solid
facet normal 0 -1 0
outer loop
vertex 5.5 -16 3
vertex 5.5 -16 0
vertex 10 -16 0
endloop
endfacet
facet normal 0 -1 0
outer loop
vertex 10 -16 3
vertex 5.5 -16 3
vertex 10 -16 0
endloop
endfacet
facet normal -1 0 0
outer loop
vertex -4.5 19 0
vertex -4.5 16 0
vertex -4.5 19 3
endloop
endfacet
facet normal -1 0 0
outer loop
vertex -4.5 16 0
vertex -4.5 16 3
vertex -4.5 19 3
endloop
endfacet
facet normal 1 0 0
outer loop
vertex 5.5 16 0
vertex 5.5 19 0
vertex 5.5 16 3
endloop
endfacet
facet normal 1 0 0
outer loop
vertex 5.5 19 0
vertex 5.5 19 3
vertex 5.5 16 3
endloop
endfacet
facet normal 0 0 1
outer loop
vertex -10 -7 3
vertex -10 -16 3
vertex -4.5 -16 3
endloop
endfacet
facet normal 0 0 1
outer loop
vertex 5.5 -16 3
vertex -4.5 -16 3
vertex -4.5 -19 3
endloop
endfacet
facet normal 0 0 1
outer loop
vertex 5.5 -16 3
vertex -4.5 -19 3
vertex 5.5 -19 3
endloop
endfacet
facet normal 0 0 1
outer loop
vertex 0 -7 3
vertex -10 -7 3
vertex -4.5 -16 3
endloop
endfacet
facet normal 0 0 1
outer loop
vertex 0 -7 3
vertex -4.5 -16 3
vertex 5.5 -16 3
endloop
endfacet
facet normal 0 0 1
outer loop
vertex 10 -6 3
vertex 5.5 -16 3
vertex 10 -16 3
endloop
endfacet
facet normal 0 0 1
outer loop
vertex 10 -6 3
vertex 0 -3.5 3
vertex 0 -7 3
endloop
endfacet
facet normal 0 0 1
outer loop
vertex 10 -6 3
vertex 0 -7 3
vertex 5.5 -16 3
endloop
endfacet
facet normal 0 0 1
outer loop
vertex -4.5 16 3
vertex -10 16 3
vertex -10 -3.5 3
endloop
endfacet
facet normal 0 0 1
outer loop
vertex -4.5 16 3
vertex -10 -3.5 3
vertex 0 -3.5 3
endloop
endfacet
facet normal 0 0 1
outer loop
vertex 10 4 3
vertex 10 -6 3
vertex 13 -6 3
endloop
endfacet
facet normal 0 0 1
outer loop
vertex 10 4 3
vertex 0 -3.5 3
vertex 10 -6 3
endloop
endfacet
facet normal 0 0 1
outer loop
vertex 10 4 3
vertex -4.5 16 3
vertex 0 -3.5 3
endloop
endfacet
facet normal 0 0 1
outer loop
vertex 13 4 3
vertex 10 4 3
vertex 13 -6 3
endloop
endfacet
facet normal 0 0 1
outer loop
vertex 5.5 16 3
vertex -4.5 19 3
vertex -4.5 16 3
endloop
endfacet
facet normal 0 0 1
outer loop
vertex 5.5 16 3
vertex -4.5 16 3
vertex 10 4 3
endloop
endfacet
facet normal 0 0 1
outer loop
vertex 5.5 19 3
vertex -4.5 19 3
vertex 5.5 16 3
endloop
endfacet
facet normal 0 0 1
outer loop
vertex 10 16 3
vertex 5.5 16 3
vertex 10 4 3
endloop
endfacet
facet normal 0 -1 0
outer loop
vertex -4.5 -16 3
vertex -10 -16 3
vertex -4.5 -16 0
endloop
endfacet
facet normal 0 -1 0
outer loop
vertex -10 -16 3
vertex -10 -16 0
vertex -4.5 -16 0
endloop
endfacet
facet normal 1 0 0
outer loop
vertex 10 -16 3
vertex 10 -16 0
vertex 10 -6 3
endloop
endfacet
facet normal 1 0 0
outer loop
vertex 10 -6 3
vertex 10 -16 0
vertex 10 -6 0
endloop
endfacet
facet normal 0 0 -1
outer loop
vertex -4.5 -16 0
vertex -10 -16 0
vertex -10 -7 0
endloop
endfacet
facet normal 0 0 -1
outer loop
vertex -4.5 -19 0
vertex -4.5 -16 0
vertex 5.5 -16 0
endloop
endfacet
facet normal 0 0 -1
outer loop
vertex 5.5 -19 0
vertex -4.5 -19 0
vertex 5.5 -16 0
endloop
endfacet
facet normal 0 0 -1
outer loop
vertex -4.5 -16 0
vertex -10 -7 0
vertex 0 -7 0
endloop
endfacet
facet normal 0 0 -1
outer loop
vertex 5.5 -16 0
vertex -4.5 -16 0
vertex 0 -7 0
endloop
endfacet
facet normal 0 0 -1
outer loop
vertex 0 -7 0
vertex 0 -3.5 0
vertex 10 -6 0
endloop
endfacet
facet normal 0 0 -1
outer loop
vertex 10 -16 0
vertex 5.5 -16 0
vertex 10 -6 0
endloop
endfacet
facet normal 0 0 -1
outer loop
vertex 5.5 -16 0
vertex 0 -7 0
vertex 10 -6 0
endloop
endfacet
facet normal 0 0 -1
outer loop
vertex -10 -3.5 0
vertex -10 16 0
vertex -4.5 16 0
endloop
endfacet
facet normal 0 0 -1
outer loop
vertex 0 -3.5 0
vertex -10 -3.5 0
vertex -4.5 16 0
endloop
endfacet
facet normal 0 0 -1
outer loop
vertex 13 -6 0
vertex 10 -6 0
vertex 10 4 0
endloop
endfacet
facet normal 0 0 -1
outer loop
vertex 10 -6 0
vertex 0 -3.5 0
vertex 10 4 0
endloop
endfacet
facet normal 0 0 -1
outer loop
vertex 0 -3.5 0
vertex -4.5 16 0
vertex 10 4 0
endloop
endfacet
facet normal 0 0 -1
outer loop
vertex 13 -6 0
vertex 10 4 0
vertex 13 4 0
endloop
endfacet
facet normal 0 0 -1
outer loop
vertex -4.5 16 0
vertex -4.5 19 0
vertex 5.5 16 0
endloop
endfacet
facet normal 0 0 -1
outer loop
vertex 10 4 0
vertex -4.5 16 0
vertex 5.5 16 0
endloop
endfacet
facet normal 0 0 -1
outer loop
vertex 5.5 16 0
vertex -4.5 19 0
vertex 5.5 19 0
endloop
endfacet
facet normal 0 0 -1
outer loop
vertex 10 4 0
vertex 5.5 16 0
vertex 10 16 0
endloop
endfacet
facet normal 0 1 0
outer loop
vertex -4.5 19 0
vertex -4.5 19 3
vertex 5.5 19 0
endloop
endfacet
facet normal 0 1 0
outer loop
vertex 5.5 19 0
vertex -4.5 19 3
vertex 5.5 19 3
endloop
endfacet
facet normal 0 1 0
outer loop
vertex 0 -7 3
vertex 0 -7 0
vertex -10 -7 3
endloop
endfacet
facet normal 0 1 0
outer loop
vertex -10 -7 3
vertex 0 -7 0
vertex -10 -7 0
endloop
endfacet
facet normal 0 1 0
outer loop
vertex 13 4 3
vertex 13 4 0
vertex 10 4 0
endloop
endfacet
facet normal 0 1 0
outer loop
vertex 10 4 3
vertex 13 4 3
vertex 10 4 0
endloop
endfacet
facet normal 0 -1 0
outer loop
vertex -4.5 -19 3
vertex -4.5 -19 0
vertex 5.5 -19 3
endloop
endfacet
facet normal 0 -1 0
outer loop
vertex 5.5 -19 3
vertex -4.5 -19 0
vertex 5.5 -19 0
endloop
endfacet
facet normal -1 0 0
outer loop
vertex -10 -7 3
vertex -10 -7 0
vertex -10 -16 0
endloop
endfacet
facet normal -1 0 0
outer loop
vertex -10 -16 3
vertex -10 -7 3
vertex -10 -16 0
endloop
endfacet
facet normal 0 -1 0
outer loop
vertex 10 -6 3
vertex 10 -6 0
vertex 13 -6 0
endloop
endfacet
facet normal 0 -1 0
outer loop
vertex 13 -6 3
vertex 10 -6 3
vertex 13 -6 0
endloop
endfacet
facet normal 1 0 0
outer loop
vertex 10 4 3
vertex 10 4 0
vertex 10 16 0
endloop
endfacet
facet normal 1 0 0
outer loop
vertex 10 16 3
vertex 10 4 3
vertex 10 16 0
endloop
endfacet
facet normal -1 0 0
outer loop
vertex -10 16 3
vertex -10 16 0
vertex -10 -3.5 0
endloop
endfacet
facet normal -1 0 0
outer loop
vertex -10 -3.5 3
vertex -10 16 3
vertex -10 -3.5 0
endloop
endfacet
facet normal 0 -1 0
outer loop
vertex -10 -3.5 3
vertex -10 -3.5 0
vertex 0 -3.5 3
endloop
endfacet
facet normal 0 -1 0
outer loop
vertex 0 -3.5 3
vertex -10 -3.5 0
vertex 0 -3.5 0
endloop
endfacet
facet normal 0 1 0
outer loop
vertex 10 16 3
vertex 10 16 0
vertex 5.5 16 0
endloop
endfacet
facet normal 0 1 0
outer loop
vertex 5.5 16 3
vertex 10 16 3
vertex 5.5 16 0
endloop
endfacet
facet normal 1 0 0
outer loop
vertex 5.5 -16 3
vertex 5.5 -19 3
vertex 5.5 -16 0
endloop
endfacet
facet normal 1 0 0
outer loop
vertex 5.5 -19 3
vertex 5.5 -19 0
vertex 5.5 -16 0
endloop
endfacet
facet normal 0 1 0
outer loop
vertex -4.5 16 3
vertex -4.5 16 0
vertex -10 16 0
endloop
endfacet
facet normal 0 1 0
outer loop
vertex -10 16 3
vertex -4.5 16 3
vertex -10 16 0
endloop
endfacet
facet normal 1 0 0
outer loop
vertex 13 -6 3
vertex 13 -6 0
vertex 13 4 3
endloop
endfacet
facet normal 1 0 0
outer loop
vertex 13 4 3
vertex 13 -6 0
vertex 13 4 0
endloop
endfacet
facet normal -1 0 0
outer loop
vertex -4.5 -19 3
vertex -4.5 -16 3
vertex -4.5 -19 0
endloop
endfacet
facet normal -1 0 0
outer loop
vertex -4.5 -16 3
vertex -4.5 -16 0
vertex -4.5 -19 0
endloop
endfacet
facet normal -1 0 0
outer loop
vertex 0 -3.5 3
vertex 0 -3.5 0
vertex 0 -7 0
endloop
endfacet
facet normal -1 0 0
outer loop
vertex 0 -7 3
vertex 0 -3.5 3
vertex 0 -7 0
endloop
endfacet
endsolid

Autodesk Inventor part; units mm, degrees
ref_plane "YZ Plane" through (0, 0, 0) normal (1, 0, 0) x (0, 1, 0)
ref_plane "XZ Plane" through (0, 0, 0) normal (0, 1, 0) x (-1, 0, 0)
ref_plane "XY Plane" through (0, 0, 0) normal (0, 0, 1) x (1, 0, 0)
sketch "Sketch1" plane through (0, 0, 0) normal (0, 0, 1) x (1, 0, 0)
  line L0 (-10, -16) -> (10, -16)
  line L1 (10, -16) -> (10, 16)
  line L2 (10, 16) -> (-10, 16)
  line L3 (-10, 16) -> (-10, -16)
  line L4 (-10, -16) -> (10, 16) construction
  line L5 (10, -16) -> (-10, 16) construction
  point P0 (0, 0)
  dimension "d0" = 32
  dimension "d1" = 20
extrude "Extrusion1" add sketch "Sketch1" along normal blind 3
sketch "Sketch2" plane through (0, 0, 0) normal (0, 0, -1) x (-1, 0, 0)
  line L0 (10, -16) -> (-10, -16) projected
  line L1 (-5.5, -16) -> (4.5, -16)
  line L2 (4.5, -16) -> (4.5, -19)
  line L3 (4.5, -19) -> (-5.5, -19)
  line L4 (-5.5, -19) -> (-5.5, -16)
  line L5 (-10, -16) -> (-10, 16) projected
  point P0 (0, 0)
  dimension "d4" = 10
  dimension "d5" = 3
  dimension "d6" = 4.5
extrude "Extrusion2" add sketch "Sketch2" against normal blind 3
sketch "Sketch3" plane through (0, 0, 0) normal (0, 0, -1) x (-1, 0, 0)
  line L0 (-10, -16) -> (-10, 16) projected
  line L1 (-10, -6) -> (-13, -6)
  line L2 (-13, -6) -> (-13, 4)
  line L3 (-13, 4) -> (-10, 4)
  line L4 (-10, 4) -> (-10, -6)
  line L5 (-5.5, -16) -> (-10, -16) projected
  point P0 (0, 0)
  dimension "d9" = 3
  dimension "d10" = 10
  dimension "d11" = 10
extrude "Extrusion3" add sketch "Sketch3" against normal blind 3
sketch "Sketch4" plane through (0, 0, 0) normal (0, 0, -1) x (-1, 0, 0)
  line L0 (10, 16) -> (10, -16) projected
  line L1 (10, -3.5) -> (0, -3.5)
  line L2 (0, -3.5) -> (0, -7)
  line L3 (0, -7) -> (10, -7)
  line L4 (10, -7) -> (10, -3.5)
  line L5 (10, -16) -> (4.5, -16) projected
  point P0 (0, 0)
  dimension "d14" = 10
  dimension "d15" = 3.5
  dimension "d16" = 9
extrude "Extrusion4" cut sketch "Sketch4" against normal blind 3
sketch "Sketch5" plane through (0, 0, 3) normal (0, 0, 1) x (1, 0, 0)
  line L0 (10, 16) -> (-10, 16) projected
  line L1 (5.5, 16) -> (-4.5, 16)
  line L2 (-4.5, 16) -> (-4.5, 19)
  line L3 (-4.5, 19) -> (5.5, 19)
  line L4 (5.5, 19) -> (5.5, 16)
  line L5 (5.5, -19) -> (5.5, -16) projected
  point P0 (0, 0)
  dimension "d19" = 10
  dimension "d20" = 3
extrude "Extrusion5" add sketch "Sketch5" against normal blind 3
properties part number "Board holders"
